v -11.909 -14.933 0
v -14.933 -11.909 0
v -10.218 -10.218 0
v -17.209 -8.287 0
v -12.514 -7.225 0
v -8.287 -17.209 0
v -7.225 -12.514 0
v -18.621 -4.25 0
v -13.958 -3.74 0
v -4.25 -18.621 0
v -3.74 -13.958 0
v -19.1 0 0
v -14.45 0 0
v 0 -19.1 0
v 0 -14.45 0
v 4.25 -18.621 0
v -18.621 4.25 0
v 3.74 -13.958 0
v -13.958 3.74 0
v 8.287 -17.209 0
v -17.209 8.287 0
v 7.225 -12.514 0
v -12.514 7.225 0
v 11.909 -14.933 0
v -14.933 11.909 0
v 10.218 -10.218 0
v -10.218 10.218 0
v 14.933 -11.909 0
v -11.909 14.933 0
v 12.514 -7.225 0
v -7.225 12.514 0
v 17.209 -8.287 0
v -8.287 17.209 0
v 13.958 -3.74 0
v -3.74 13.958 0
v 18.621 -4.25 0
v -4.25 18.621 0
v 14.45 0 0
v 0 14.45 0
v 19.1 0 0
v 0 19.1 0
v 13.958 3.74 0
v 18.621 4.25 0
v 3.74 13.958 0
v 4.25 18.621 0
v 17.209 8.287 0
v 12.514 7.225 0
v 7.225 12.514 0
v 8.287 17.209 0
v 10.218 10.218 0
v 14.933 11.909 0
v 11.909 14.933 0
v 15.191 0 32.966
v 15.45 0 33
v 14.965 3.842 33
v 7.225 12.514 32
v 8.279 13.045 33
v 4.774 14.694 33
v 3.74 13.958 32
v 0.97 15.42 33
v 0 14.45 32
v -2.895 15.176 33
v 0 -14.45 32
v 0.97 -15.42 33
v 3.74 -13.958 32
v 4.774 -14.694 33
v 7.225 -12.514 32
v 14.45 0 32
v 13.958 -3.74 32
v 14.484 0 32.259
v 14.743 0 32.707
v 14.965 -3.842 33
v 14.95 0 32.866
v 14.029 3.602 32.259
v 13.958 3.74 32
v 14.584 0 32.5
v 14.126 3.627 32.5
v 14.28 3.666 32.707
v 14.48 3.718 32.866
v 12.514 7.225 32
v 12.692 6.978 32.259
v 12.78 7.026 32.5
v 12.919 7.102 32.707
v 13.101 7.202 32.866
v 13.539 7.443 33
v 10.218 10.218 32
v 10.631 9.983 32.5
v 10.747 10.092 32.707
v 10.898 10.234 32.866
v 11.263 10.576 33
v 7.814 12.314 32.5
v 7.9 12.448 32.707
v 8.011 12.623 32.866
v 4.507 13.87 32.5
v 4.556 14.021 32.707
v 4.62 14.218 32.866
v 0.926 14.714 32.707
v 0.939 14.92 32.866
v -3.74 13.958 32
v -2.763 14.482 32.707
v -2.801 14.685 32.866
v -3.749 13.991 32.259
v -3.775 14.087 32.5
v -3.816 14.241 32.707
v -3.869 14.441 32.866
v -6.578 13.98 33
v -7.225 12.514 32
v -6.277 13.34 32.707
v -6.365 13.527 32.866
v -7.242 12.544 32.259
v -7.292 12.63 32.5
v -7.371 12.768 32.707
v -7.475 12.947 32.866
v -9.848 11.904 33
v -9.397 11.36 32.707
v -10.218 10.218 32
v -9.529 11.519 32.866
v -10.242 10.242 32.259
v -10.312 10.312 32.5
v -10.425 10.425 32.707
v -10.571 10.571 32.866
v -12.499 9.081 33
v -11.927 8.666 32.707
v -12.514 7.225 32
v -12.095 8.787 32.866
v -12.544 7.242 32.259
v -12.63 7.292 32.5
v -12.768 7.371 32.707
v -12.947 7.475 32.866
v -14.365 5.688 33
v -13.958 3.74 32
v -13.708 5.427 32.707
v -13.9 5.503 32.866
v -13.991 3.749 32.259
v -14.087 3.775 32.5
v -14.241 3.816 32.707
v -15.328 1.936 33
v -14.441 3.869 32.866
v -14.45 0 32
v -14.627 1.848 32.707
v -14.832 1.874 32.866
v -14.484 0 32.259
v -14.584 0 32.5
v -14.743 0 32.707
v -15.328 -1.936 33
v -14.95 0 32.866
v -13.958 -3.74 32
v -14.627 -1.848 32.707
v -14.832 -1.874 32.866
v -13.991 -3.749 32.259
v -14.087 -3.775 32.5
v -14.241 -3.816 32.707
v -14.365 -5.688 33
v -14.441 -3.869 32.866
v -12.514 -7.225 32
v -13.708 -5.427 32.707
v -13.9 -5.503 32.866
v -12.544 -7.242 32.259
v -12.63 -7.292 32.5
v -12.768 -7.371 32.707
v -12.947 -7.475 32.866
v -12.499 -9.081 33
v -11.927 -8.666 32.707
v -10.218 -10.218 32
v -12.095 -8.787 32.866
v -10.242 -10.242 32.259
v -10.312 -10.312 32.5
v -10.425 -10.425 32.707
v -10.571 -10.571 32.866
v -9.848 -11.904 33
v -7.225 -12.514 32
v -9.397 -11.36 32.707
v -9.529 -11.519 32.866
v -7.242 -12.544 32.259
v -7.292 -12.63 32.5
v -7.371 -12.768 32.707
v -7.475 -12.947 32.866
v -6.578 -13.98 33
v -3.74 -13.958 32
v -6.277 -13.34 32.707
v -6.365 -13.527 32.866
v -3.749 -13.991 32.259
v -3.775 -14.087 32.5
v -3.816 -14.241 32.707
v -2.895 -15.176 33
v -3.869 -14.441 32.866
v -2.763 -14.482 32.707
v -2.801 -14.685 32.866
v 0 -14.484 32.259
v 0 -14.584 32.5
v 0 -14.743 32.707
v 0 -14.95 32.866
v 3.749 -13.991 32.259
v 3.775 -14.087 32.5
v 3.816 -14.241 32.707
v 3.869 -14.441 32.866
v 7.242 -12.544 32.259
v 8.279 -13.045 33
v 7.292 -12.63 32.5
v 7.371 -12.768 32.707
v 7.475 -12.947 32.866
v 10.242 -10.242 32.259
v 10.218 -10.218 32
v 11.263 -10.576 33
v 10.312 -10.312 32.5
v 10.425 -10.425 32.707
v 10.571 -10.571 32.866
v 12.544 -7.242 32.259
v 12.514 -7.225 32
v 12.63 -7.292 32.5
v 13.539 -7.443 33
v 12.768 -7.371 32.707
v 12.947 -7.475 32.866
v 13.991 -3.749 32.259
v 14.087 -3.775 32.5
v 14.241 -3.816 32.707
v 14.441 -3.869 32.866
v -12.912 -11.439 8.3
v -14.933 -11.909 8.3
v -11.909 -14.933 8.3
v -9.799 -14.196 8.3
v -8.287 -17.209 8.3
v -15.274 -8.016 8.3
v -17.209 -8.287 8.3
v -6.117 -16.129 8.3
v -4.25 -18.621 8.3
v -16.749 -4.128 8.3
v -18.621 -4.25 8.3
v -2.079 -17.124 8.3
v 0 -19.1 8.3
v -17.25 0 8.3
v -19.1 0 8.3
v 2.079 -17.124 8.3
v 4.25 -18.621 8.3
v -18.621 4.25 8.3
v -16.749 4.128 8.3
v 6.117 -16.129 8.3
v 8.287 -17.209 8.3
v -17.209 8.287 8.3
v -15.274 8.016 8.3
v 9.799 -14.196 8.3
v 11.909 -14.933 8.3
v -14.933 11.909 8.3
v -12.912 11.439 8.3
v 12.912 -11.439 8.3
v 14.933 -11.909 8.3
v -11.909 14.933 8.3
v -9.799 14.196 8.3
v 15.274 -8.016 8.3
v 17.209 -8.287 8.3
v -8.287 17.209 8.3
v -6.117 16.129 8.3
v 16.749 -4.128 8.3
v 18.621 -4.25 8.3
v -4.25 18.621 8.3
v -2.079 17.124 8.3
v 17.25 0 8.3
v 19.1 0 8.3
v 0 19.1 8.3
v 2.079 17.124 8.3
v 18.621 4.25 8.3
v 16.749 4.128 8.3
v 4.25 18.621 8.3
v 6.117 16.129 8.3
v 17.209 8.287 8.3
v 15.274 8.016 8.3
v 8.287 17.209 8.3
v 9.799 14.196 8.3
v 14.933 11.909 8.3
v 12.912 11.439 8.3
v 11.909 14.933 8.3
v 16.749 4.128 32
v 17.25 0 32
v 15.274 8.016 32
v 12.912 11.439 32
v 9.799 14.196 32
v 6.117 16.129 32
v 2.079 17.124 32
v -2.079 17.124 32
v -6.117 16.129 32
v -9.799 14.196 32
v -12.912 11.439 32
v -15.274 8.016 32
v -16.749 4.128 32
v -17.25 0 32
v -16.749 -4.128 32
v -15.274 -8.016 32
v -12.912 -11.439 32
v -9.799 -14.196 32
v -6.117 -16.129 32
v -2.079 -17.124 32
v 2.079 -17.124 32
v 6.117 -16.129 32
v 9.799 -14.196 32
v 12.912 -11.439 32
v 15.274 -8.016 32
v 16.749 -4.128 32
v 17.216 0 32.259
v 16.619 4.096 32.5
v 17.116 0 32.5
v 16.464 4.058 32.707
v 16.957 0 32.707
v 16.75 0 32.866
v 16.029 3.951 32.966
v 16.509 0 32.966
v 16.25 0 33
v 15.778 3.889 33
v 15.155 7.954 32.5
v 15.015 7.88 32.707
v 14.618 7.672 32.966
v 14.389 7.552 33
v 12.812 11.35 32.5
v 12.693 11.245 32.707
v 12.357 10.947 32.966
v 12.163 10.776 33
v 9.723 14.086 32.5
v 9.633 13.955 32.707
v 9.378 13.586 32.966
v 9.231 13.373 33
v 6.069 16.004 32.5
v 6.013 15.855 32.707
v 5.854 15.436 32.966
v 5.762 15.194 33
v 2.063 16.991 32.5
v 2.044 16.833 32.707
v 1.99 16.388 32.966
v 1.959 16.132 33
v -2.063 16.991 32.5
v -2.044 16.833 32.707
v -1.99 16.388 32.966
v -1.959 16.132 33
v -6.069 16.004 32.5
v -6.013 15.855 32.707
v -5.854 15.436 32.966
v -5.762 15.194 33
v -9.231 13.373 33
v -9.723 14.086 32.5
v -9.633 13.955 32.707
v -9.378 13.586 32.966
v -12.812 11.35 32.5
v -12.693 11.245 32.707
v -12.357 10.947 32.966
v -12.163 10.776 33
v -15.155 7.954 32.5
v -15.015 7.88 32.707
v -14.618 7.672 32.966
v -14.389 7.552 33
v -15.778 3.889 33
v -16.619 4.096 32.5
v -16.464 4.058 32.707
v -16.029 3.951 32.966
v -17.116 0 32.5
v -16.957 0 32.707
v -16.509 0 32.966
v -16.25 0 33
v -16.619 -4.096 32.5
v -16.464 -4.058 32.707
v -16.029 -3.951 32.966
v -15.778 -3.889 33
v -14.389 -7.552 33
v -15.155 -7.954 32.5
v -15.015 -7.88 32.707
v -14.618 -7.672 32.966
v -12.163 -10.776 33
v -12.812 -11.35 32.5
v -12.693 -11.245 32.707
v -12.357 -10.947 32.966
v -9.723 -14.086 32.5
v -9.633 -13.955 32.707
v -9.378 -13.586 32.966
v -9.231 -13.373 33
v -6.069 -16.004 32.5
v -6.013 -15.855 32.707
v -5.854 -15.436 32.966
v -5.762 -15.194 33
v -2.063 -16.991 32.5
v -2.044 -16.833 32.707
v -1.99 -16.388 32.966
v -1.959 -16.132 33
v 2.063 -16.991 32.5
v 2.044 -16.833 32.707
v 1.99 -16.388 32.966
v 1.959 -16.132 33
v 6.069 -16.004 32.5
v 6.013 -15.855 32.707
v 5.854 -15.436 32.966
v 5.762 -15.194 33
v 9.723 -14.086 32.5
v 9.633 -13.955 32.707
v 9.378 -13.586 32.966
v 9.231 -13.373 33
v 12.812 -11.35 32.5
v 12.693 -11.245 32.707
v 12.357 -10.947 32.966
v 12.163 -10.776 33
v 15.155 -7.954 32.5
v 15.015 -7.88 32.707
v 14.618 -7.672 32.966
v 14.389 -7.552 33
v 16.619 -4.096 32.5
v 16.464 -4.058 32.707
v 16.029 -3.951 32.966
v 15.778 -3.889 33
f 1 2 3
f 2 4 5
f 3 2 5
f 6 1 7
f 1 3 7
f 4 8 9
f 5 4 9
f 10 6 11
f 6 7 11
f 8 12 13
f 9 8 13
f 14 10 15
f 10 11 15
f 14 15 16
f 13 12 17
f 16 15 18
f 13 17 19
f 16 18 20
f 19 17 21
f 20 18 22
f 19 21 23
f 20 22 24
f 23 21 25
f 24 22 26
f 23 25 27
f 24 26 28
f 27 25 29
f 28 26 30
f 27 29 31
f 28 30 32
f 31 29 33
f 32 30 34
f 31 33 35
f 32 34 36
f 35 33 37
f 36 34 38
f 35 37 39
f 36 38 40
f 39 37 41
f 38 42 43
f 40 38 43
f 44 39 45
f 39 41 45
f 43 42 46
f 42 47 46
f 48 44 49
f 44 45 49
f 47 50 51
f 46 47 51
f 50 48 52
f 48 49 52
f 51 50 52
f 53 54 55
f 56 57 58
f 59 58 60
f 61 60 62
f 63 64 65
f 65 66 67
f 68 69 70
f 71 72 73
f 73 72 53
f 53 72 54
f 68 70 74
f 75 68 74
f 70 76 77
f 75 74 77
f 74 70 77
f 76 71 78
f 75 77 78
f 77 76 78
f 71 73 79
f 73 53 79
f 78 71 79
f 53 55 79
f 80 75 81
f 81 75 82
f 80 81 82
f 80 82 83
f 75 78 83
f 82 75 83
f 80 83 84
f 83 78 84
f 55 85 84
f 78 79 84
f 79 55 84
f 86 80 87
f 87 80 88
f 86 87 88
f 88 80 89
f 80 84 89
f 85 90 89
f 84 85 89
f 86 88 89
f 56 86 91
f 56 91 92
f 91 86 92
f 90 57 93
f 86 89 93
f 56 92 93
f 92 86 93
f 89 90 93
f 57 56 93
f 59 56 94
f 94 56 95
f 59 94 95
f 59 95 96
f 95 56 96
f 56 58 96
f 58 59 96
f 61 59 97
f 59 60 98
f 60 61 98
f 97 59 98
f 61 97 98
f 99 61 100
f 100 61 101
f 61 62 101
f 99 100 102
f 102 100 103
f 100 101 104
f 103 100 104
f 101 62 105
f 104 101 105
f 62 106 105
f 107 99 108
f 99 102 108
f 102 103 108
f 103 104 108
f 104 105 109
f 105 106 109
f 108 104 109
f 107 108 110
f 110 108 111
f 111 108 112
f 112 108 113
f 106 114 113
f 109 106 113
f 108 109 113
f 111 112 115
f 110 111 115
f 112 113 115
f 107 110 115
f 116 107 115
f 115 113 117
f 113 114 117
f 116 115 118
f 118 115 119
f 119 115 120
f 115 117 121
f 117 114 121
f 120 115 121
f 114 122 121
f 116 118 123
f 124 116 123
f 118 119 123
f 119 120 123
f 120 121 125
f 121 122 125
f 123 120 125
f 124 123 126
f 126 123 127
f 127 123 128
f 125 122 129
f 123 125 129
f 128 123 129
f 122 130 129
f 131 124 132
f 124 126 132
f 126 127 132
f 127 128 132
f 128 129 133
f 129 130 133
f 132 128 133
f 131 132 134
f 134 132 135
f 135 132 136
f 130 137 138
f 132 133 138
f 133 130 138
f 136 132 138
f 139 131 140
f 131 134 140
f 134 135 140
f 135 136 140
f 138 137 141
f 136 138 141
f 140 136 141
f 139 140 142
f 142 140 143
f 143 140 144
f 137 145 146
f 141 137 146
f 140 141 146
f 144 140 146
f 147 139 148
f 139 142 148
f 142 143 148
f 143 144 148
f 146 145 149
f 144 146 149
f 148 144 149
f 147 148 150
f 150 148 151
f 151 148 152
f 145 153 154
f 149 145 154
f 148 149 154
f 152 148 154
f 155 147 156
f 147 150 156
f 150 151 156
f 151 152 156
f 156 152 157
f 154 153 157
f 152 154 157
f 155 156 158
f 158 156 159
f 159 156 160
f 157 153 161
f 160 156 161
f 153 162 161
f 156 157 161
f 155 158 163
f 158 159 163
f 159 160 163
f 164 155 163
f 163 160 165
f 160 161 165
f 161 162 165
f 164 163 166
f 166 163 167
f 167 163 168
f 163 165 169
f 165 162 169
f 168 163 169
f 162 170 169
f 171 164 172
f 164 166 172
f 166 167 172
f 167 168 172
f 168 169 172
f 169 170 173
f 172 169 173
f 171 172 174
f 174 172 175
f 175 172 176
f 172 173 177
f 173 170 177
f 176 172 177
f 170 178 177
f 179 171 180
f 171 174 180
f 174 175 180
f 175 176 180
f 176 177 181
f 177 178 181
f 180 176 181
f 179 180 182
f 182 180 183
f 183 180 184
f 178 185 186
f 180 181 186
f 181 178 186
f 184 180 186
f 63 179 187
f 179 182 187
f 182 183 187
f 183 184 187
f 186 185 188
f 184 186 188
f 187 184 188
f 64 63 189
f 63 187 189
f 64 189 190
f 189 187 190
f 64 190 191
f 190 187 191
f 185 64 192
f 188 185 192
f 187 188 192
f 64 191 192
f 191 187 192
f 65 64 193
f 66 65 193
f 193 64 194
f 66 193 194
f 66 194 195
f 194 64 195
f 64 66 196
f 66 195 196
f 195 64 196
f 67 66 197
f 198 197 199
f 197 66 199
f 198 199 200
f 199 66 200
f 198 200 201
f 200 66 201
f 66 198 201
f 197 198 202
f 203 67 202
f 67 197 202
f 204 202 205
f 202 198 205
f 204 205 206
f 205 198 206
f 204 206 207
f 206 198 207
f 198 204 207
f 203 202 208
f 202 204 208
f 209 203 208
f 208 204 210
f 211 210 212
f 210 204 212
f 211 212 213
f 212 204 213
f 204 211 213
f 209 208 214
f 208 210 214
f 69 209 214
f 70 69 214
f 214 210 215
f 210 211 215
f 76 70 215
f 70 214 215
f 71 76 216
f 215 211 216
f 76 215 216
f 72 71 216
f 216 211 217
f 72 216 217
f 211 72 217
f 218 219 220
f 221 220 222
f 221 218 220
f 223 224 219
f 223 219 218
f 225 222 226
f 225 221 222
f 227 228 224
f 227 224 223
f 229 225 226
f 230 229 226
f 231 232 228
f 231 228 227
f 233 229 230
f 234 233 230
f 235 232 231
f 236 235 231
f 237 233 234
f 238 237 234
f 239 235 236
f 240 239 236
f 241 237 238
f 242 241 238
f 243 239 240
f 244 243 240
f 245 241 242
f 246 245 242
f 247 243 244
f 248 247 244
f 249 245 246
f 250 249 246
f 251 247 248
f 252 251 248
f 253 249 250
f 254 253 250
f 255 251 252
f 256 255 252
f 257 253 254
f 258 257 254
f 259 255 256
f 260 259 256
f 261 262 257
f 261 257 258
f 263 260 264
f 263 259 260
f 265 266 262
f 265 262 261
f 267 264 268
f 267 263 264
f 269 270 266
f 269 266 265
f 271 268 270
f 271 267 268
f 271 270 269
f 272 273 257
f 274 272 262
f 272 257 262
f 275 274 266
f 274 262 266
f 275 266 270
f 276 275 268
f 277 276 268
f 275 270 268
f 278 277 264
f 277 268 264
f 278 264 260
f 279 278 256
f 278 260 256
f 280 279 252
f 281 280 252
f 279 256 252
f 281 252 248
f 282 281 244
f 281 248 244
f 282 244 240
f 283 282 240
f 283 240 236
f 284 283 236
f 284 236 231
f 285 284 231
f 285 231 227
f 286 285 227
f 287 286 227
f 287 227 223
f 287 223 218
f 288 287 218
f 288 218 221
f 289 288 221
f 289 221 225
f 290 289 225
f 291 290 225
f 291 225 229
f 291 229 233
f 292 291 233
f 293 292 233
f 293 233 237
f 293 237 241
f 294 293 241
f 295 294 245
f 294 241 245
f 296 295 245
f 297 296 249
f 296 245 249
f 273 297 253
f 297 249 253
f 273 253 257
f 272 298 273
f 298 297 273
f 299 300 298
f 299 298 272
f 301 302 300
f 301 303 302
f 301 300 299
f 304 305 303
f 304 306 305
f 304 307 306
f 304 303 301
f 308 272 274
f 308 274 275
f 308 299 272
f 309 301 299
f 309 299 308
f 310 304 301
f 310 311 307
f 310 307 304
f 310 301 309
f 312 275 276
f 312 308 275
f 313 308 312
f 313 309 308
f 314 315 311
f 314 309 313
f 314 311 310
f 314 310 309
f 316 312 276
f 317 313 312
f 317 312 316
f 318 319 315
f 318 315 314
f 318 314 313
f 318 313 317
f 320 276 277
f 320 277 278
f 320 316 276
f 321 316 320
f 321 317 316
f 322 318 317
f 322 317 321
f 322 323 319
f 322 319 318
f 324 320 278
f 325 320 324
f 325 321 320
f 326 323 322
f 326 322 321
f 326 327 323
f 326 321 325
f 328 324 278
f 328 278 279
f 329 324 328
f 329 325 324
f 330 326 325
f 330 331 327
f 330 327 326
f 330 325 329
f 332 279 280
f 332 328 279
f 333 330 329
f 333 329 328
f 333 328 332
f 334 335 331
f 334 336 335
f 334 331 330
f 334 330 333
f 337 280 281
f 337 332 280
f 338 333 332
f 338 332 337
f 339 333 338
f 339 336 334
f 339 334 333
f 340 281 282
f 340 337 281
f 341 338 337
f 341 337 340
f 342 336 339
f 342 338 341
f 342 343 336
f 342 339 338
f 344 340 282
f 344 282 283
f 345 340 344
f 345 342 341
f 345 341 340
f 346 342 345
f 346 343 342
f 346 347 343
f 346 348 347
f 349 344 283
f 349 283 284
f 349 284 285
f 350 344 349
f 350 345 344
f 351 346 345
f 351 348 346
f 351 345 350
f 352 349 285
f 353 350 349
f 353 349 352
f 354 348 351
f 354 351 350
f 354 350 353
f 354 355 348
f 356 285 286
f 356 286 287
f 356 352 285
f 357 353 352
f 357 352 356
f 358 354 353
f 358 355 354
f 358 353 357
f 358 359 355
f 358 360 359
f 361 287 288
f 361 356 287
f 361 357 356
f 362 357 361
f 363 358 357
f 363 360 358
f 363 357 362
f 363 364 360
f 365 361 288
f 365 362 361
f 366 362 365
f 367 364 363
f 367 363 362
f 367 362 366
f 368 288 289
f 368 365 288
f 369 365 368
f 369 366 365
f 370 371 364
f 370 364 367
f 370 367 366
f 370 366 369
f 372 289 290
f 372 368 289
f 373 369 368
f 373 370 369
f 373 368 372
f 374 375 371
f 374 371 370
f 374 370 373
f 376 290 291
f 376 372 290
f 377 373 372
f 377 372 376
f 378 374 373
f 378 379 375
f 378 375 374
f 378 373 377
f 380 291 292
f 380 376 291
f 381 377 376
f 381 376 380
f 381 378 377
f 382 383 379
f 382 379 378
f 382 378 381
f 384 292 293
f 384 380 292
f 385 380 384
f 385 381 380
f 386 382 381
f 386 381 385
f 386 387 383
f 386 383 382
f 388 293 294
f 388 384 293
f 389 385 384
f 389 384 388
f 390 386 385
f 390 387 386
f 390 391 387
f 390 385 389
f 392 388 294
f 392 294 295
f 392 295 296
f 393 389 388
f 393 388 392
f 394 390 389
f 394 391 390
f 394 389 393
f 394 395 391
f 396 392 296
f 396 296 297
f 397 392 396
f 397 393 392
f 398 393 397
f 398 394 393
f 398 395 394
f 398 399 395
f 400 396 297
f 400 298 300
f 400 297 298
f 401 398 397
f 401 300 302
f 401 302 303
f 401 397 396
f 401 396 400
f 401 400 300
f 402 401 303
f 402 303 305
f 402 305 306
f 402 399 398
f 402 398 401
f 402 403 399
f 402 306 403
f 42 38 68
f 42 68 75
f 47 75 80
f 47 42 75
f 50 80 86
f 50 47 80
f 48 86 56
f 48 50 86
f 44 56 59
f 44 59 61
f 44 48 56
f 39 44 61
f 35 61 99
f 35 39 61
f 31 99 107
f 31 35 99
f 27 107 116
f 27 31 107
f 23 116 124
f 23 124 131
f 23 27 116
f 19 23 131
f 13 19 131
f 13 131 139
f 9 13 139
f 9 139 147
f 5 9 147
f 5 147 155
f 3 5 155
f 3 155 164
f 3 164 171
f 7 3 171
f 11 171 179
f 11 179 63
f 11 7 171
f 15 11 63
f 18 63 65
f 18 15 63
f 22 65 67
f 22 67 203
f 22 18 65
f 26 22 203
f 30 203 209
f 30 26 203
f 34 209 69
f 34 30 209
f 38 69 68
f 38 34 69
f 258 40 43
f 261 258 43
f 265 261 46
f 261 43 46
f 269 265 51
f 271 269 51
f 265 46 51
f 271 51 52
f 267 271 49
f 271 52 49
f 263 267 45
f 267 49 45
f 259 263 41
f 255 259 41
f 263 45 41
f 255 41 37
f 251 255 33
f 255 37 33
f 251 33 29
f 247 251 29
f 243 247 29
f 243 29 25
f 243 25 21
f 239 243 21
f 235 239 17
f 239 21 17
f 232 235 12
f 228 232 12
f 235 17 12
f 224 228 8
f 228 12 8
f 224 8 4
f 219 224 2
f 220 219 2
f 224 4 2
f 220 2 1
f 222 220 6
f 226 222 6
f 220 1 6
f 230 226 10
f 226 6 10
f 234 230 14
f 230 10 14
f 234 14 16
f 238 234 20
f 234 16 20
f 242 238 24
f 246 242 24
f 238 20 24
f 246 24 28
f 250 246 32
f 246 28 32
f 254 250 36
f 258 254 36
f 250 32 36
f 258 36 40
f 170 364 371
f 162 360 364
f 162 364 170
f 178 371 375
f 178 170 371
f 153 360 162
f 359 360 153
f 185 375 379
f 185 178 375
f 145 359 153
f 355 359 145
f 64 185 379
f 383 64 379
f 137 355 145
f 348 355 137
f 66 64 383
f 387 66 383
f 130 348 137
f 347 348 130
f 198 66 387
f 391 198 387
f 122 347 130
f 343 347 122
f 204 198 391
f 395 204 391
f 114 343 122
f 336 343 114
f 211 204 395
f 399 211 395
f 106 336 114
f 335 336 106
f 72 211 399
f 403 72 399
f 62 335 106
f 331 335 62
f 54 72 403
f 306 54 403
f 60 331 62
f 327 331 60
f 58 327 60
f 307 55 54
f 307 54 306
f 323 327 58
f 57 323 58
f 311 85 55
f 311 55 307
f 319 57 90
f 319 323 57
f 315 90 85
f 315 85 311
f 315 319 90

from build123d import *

# Parameters (mm, degrees)
F0_R     = 17.25
F0_R_2   = 14.45
F1_DEPTH = 33
F0_R_3   = 19.1
F2_DEPTH = 8.3
F3_R     = 1


with BuildPart() as f1:
    # F0 (on Top) → F1 (new body)
    with BuildSketch(Plane.XY):
        Circle(F0_R)
        Circle(F0_R_2, mode=Mode.SUBTRACT)
    extrude(amount=F1_DEPTH)

    # F0 (on Top) → F2 (join)
    with BuildSketch(Plane.XY):
        Circle(F0_R_3)
        Circle(F0_R, mode=Mode.SUBTRACT)
    extrude(amount=F2_DEPTH)

    # F3
    f3_edges = [f1.edges().sort_by_distance(p)[0] for p in [
        (-17.25, 0, 33),
        (-14.45, 0, 33),
    ]]
    fillet(f3_edges, radius=F3_R)


solid = f1.part
